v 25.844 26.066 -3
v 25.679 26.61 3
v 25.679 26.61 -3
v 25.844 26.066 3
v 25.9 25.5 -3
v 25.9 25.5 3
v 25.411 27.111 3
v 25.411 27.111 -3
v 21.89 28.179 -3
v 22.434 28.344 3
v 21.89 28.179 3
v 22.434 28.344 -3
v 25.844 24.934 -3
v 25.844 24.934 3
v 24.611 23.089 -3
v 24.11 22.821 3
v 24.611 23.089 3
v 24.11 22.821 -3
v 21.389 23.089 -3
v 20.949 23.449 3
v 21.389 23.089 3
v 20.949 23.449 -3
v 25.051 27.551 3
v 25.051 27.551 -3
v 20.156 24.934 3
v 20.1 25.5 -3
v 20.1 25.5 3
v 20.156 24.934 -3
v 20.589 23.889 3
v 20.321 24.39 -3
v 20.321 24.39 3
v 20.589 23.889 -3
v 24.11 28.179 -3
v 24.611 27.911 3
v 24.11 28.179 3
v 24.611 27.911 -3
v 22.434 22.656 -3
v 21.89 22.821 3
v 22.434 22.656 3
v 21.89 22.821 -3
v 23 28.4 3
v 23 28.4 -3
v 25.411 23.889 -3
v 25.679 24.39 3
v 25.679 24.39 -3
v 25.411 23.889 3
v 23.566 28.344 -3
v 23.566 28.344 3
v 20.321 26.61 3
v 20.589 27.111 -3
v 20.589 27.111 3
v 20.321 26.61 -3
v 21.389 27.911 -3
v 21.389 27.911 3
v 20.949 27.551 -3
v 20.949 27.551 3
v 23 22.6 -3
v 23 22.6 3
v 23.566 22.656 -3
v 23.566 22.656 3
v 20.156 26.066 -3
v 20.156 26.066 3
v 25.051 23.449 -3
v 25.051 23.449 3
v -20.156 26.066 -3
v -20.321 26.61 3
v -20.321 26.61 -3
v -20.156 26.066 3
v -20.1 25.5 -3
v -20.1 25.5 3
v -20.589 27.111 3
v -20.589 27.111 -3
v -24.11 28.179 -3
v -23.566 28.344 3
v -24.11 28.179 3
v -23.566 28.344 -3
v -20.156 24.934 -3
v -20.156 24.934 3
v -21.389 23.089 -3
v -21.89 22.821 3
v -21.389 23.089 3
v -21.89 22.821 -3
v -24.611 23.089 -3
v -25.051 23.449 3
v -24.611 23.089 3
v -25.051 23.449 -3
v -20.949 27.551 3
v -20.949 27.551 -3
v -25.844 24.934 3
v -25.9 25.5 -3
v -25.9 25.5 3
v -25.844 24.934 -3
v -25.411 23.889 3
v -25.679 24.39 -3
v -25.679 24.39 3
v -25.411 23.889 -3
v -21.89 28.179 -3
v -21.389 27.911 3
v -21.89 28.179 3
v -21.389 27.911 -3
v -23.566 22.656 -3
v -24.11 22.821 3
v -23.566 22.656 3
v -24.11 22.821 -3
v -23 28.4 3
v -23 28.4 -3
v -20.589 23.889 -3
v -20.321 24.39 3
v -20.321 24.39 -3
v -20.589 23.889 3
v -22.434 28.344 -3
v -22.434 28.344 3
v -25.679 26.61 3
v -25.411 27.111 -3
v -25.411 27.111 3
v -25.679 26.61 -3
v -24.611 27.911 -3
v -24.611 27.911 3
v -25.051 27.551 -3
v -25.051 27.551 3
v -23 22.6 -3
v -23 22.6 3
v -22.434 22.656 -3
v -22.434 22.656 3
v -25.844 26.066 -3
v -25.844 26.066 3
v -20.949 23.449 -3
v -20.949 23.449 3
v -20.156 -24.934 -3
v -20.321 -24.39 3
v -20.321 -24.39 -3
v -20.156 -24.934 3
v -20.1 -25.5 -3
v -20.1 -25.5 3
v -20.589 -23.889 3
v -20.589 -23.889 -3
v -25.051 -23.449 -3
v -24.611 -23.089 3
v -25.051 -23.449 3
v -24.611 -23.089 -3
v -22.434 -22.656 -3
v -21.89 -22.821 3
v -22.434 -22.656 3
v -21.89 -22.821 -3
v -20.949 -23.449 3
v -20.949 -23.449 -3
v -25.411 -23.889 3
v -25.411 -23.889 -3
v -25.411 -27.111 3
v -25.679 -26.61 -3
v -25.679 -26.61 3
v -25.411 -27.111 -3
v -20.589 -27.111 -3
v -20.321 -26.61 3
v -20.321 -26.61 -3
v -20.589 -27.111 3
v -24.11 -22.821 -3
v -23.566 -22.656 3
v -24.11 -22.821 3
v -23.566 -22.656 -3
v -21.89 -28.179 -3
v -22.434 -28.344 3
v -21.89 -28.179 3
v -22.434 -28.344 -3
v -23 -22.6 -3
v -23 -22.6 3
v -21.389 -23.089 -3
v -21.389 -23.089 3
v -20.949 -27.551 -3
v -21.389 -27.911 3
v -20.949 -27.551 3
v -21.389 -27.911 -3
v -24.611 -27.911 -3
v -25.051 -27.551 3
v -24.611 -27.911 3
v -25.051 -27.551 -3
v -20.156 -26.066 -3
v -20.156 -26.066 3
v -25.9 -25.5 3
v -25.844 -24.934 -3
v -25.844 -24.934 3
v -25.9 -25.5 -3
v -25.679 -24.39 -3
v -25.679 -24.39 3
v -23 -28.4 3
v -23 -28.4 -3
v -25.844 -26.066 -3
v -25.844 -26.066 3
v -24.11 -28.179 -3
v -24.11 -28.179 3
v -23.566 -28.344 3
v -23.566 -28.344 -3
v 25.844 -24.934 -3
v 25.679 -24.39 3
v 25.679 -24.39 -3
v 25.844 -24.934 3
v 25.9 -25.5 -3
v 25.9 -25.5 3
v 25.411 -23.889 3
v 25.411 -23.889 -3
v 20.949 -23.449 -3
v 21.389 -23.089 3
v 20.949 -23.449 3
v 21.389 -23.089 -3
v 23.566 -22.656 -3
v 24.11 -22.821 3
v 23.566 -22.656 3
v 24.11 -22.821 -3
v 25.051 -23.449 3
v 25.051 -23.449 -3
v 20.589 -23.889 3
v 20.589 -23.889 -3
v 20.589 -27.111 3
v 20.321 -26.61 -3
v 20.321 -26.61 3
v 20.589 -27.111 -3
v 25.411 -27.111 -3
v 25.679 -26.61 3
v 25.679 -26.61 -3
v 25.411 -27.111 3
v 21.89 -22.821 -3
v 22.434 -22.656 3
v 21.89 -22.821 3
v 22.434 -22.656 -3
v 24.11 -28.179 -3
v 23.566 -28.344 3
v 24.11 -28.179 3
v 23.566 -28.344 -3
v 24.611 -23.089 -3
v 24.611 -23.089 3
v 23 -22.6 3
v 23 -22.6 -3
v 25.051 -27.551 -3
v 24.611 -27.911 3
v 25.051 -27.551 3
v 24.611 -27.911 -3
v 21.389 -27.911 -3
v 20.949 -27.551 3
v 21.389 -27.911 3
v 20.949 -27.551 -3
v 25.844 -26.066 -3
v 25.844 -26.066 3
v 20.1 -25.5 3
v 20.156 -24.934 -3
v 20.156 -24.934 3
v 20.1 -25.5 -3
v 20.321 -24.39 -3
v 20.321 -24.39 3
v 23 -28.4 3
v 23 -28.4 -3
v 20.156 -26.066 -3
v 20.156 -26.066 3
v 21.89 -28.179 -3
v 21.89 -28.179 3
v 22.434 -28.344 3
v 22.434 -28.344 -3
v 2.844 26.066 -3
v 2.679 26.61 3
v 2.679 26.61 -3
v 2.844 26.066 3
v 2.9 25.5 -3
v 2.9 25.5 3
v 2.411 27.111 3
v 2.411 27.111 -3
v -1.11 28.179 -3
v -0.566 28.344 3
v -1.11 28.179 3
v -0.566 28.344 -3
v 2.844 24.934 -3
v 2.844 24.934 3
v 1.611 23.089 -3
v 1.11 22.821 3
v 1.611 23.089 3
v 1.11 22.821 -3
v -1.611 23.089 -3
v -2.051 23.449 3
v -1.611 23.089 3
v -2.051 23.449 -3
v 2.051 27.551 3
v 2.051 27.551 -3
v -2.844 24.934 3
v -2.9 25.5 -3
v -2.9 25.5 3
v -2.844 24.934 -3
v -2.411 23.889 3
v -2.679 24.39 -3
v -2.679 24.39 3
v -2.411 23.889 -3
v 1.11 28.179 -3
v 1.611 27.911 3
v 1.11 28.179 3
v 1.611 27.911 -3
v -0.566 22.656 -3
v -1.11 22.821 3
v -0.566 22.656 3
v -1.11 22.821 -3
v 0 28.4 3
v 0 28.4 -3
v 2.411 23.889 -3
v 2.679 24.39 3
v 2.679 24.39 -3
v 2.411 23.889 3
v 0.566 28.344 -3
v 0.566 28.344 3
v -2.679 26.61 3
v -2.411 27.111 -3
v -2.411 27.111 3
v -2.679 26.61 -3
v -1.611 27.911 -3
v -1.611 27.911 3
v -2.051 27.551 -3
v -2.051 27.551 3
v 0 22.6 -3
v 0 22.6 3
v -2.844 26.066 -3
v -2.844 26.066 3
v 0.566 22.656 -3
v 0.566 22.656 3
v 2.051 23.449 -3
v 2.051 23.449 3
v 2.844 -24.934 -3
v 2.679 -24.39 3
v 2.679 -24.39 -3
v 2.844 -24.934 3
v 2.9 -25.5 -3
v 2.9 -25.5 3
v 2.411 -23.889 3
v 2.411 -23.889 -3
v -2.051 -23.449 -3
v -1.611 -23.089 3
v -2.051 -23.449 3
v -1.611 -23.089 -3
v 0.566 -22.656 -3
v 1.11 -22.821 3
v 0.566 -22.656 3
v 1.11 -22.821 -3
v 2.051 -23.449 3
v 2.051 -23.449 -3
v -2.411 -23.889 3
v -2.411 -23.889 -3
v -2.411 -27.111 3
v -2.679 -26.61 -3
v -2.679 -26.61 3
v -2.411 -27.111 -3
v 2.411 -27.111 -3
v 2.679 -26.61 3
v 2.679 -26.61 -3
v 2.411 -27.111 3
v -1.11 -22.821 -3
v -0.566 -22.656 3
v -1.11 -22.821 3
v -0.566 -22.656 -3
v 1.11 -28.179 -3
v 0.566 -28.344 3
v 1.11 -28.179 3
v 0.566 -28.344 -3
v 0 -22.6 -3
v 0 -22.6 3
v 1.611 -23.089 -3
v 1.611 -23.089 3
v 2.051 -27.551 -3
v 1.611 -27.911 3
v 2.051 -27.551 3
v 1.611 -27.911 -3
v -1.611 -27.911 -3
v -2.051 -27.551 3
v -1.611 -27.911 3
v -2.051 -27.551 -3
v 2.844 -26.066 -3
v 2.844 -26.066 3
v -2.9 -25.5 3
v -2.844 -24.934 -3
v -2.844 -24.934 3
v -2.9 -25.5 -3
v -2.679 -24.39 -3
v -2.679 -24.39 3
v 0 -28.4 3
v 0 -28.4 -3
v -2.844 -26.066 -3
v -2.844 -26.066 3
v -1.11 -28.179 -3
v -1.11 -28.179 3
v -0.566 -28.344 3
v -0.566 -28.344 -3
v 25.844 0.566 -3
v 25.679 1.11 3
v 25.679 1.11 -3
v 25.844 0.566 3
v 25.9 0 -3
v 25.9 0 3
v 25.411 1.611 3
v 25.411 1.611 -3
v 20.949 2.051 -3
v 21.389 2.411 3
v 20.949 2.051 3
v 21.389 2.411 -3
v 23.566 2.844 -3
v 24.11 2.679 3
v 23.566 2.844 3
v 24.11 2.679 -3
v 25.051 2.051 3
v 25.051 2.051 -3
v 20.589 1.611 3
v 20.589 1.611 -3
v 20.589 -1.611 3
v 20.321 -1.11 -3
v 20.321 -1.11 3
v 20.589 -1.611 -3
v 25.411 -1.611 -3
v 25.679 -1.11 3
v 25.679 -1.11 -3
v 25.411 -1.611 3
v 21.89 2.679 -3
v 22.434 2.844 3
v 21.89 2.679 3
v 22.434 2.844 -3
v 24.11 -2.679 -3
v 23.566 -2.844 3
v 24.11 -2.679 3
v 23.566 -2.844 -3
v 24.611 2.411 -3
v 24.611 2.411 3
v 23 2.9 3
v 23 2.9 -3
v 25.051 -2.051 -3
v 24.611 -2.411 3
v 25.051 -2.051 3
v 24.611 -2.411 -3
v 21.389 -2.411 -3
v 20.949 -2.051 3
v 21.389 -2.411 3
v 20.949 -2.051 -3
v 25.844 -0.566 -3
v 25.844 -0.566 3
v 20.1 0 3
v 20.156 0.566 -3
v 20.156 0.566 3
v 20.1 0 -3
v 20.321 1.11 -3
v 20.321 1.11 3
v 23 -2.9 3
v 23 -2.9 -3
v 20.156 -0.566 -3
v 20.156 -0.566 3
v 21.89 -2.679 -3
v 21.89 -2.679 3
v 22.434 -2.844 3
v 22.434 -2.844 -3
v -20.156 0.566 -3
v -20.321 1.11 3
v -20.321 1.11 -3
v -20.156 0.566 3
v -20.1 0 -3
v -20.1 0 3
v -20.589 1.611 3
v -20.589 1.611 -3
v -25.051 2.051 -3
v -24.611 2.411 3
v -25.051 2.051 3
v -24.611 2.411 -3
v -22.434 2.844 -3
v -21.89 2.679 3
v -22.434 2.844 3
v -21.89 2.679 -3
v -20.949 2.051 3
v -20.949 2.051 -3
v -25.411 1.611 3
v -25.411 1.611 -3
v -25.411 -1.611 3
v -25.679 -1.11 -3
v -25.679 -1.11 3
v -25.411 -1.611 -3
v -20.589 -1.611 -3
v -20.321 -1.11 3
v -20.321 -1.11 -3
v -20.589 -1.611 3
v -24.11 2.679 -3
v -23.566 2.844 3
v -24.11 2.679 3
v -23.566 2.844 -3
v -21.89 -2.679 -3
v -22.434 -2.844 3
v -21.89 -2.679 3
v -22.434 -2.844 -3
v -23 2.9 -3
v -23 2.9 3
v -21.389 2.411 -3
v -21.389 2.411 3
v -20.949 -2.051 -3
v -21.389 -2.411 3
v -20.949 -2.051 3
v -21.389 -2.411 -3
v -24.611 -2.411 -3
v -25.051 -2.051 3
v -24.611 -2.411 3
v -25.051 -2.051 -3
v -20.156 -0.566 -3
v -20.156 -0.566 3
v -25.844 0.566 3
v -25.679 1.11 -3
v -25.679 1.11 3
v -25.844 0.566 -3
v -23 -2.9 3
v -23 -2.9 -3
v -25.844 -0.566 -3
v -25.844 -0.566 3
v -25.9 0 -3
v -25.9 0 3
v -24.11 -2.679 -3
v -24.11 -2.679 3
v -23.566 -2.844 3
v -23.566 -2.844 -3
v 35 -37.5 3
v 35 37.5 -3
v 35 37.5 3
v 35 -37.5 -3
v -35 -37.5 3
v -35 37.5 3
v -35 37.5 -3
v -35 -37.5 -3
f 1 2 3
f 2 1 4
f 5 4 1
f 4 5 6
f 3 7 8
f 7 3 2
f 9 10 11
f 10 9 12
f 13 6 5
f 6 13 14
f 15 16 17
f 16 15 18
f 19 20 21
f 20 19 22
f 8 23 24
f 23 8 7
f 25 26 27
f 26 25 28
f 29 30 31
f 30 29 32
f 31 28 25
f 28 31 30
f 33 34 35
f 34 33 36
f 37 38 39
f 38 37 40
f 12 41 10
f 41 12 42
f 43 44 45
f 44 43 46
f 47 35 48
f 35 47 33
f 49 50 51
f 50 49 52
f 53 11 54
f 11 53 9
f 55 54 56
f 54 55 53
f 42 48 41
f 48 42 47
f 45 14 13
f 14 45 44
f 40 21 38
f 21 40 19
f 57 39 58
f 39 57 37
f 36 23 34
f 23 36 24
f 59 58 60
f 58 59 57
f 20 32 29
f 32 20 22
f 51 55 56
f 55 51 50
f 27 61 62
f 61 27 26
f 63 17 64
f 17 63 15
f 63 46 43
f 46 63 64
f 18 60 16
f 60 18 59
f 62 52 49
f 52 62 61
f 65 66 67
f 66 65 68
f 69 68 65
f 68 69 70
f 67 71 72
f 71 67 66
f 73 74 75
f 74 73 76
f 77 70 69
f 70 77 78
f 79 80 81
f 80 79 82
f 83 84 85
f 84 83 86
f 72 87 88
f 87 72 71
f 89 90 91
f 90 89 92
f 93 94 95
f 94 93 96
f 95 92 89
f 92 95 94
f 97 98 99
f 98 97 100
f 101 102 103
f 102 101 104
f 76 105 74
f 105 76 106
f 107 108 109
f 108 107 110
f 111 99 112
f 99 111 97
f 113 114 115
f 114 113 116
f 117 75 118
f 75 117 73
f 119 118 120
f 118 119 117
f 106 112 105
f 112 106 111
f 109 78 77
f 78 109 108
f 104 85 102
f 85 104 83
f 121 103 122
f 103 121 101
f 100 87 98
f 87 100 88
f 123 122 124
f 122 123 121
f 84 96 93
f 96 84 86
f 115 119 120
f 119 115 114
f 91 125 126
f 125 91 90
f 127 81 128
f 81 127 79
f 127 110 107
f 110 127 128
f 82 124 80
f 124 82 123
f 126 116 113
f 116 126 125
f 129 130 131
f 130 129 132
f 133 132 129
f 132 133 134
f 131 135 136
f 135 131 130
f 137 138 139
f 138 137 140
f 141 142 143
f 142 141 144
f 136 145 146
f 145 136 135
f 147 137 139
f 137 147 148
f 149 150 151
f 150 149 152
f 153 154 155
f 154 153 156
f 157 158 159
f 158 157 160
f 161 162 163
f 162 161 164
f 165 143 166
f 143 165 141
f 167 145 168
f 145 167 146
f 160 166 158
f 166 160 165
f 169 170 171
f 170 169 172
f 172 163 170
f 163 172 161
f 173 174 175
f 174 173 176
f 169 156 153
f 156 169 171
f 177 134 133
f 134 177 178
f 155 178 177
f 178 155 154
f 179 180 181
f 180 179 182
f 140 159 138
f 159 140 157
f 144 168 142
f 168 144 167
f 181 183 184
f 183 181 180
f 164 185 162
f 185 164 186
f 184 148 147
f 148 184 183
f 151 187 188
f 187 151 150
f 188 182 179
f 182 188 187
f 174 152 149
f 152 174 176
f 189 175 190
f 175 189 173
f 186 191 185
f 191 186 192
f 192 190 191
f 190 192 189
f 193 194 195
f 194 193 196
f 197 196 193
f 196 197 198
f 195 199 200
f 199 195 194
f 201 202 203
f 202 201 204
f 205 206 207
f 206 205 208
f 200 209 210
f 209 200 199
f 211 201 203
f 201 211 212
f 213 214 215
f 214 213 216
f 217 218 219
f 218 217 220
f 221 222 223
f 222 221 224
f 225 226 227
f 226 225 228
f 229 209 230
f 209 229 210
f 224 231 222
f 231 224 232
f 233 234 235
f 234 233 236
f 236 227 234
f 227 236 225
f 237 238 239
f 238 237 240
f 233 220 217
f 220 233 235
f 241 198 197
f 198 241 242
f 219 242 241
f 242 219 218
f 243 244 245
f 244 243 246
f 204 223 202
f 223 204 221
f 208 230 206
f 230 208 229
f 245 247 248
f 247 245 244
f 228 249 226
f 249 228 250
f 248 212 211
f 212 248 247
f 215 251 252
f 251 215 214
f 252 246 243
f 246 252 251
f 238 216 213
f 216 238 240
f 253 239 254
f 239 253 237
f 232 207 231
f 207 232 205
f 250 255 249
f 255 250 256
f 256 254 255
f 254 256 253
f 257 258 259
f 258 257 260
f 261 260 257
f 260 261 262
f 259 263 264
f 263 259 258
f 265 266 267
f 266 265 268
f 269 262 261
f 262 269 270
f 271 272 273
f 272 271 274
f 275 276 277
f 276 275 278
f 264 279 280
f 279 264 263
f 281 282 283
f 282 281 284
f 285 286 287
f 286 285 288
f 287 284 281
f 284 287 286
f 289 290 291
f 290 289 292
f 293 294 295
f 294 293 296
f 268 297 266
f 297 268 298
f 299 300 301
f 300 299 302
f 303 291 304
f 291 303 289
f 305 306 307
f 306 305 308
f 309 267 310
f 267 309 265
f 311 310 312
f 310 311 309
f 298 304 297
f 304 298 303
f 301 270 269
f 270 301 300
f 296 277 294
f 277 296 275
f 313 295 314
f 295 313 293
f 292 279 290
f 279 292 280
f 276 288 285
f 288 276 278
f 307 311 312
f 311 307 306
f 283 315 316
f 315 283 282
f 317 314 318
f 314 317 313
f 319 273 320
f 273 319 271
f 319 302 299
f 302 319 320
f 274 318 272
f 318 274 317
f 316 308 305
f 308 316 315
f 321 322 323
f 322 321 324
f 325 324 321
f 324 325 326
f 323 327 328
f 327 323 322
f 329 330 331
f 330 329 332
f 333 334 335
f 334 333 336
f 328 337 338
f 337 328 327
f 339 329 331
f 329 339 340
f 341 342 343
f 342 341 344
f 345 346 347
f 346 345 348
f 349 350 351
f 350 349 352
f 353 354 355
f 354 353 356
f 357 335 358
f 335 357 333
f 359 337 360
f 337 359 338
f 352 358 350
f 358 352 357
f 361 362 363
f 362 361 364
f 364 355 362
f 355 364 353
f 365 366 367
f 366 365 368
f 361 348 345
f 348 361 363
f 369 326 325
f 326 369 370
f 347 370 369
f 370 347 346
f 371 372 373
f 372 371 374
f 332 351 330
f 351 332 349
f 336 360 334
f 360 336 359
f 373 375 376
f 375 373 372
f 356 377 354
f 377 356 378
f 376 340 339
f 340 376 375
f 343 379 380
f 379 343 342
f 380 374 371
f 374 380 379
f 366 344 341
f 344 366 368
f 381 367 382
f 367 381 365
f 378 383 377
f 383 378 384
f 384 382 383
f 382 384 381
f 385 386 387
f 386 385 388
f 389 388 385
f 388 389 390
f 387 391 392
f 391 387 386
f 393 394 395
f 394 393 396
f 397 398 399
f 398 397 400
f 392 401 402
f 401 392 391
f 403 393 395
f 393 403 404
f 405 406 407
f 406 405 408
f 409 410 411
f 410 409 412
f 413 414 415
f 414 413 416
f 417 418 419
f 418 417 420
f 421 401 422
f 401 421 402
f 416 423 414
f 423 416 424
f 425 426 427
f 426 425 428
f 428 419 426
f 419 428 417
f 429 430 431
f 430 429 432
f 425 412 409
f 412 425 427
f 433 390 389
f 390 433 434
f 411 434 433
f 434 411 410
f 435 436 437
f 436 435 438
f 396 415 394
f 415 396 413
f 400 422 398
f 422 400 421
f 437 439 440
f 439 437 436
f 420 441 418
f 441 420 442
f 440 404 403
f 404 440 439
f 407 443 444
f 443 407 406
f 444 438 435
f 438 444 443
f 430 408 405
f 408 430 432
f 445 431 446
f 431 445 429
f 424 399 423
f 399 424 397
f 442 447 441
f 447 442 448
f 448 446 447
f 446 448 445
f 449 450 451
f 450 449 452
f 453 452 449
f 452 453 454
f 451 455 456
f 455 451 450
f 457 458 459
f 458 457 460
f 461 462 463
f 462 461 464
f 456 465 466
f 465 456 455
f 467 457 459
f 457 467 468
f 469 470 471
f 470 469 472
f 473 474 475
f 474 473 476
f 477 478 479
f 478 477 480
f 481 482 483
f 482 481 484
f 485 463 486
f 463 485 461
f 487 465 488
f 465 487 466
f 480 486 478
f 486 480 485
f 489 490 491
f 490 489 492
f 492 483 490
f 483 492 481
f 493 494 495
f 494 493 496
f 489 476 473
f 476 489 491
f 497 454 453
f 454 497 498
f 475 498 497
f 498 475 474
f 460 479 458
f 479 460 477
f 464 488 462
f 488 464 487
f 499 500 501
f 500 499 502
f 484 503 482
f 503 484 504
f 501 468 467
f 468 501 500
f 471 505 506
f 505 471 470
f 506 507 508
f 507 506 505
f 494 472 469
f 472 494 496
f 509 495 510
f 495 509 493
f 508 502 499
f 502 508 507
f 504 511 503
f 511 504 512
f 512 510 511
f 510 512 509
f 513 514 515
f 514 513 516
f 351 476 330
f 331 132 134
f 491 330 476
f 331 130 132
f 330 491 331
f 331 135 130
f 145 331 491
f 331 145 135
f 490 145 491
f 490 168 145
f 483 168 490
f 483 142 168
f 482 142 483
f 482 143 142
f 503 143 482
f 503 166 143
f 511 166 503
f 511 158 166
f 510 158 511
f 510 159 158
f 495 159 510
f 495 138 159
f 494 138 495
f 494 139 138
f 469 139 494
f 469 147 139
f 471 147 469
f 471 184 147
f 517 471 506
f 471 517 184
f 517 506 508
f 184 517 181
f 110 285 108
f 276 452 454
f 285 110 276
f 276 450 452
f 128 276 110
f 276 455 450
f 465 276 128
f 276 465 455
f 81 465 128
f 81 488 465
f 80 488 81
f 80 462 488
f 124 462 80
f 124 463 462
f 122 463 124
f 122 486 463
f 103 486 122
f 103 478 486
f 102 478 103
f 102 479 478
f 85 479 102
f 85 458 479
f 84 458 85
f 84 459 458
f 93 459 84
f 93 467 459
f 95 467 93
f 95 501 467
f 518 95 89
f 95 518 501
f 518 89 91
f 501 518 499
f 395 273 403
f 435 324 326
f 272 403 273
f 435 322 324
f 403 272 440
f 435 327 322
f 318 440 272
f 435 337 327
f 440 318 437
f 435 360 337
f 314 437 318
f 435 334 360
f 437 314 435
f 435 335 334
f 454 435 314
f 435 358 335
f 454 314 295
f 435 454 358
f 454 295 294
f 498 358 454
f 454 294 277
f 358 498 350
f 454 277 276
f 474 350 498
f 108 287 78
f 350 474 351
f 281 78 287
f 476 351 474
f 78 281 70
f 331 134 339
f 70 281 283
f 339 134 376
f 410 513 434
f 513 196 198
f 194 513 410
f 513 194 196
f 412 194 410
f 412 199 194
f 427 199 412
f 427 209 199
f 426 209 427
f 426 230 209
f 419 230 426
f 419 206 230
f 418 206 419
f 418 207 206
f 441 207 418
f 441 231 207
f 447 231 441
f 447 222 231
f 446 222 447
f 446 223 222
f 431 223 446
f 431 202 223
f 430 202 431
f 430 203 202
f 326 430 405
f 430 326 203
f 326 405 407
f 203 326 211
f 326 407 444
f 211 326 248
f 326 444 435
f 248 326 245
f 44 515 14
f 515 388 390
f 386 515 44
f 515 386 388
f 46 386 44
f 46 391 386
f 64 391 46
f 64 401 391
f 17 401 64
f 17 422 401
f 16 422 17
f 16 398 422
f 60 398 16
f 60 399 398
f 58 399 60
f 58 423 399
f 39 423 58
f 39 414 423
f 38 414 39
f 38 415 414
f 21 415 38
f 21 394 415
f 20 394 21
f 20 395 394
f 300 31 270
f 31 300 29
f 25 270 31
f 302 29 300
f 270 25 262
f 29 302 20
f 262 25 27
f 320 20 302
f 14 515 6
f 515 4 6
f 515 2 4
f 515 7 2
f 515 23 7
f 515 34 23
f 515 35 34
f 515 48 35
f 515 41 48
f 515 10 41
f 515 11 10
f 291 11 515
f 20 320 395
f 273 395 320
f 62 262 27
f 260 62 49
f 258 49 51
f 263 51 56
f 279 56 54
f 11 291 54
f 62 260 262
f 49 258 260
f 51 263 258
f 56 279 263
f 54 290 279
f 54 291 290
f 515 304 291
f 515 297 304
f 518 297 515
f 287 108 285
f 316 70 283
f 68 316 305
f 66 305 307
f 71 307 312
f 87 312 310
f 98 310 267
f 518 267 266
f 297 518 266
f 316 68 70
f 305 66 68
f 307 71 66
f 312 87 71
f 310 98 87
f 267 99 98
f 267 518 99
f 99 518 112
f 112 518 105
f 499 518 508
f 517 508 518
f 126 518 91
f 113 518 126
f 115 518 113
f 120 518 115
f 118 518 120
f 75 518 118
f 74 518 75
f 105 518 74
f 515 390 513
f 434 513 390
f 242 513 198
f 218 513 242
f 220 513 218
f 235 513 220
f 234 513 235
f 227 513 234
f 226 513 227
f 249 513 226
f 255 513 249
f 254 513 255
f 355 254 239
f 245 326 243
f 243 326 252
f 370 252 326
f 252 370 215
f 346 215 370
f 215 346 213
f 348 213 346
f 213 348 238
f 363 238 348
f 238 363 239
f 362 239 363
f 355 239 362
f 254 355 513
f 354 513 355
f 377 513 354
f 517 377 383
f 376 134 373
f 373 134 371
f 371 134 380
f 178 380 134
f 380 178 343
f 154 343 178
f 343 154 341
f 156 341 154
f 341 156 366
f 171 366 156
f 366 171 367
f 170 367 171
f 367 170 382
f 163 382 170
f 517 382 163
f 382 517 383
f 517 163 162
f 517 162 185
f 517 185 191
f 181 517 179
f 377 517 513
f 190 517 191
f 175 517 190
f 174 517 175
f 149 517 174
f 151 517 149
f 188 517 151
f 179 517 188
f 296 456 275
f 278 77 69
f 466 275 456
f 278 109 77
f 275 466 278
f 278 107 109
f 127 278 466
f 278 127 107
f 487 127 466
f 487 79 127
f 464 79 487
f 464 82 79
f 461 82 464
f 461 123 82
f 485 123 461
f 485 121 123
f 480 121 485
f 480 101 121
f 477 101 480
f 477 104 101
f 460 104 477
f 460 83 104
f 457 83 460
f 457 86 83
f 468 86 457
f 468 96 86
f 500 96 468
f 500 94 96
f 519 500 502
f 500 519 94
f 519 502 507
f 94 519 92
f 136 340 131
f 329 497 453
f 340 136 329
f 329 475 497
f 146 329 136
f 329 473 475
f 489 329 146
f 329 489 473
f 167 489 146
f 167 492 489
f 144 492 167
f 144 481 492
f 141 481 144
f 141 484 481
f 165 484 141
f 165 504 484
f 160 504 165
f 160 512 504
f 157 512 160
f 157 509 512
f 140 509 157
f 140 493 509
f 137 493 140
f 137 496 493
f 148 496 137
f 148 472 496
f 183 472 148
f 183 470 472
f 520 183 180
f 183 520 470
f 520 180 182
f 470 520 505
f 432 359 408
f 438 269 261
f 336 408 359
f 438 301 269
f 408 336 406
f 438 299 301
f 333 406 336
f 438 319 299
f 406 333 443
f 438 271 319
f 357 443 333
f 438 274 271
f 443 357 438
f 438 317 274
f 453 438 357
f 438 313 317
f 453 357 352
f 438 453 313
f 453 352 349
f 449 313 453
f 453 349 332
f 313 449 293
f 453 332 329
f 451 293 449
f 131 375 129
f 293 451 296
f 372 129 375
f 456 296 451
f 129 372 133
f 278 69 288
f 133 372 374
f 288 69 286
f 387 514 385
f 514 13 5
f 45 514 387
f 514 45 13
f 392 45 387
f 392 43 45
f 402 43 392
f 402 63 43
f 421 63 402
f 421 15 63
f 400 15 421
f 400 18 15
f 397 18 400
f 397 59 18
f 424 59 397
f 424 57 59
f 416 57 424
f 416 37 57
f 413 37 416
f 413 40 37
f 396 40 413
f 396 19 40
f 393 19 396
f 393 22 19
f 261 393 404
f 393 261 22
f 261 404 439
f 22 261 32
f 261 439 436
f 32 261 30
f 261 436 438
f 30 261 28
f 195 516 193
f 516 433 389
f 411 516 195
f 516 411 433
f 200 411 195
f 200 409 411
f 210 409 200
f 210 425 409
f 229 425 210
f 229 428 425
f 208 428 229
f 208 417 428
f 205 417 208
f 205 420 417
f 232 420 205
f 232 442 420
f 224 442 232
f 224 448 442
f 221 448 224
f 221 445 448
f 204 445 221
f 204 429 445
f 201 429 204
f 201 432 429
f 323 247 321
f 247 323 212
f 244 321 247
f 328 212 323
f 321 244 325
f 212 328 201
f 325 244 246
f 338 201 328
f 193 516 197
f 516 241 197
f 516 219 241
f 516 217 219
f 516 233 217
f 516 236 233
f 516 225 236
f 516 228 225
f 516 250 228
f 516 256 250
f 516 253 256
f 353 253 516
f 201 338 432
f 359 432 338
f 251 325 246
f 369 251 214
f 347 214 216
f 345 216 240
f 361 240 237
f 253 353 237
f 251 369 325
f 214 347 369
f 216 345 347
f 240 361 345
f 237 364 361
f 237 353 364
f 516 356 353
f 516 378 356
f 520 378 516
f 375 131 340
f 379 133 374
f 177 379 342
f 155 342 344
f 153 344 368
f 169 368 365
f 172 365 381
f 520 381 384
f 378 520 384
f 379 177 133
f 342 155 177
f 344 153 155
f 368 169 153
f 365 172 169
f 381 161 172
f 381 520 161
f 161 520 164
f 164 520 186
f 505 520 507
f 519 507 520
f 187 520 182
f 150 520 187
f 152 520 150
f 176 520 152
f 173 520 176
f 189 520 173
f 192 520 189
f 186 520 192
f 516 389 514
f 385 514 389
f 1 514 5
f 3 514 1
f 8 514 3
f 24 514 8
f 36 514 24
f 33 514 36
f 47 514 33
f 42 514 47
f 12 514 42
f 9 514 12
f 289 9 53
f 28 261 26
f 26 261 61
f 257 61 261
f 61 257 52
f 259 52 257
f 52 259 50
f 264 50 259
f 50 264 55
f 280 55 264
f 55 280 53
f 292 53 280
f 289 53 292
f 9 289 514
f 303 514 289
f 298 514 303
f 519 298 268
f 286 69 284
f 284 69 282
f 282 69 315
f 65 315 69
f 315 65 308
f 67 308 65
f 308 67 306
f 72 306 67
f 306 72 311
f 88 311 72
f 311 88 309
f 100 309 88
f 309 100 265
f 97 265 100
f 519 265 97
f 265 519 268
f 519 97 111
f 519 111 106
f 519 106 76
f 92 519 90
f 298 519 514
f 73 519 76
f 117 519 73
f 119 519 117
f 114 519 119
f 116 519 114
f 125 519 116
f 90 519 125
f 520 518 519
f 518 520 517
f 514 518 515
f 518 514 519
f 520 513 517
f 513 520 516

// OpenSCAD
$fn = 32;

// ----------------------------------------------------------------------
// Corner plate 70 x 75 x 6
// 8 holes, centres taken from the edge offset
// ----------------------------------------------------------------------

// --- parameters (mm) ---
plate = [70, 75, 6];    // overall size (x, y, z)
holes = 8;              // number of holes the drawing asks for
bore_d = 5.5;           // nominal hole diameter from the drawing
print_allowance = 0.3;  // clearance added for printing
edge = 12;              // hole centre offset from the plate edge

// --- derived feature positions (mm) ---
hole_d = bore_d + print_allowance;  // = 5.8   hole diameter as printed
corner_x = plate[0] / 2 - edge;     // = 23   corner hole X
corner_y = plate[1] / 2 - edge;     // = 25.5   corner hole Y
feature_centers = [
  [corner_x, corner_y],
  [-corner_x, corner_y],
  [-corner_x, -corner_y],
  [corner_x, -corner_y],
  [0, corner_y],
  [0, -corner_y],
  [corner_x, 0],
  [-corner_x, 0]
];   // hole centres the loop below drills

// plate outline, every hole drilled through with the same cutters
difference() {
  cube(plate, center = true);
  for (centre = feature_centers)
    translate([centre[0], centre[1], 0])
      cylinder(d = hole_d, h = plate[2] + 2, center = true);
}
